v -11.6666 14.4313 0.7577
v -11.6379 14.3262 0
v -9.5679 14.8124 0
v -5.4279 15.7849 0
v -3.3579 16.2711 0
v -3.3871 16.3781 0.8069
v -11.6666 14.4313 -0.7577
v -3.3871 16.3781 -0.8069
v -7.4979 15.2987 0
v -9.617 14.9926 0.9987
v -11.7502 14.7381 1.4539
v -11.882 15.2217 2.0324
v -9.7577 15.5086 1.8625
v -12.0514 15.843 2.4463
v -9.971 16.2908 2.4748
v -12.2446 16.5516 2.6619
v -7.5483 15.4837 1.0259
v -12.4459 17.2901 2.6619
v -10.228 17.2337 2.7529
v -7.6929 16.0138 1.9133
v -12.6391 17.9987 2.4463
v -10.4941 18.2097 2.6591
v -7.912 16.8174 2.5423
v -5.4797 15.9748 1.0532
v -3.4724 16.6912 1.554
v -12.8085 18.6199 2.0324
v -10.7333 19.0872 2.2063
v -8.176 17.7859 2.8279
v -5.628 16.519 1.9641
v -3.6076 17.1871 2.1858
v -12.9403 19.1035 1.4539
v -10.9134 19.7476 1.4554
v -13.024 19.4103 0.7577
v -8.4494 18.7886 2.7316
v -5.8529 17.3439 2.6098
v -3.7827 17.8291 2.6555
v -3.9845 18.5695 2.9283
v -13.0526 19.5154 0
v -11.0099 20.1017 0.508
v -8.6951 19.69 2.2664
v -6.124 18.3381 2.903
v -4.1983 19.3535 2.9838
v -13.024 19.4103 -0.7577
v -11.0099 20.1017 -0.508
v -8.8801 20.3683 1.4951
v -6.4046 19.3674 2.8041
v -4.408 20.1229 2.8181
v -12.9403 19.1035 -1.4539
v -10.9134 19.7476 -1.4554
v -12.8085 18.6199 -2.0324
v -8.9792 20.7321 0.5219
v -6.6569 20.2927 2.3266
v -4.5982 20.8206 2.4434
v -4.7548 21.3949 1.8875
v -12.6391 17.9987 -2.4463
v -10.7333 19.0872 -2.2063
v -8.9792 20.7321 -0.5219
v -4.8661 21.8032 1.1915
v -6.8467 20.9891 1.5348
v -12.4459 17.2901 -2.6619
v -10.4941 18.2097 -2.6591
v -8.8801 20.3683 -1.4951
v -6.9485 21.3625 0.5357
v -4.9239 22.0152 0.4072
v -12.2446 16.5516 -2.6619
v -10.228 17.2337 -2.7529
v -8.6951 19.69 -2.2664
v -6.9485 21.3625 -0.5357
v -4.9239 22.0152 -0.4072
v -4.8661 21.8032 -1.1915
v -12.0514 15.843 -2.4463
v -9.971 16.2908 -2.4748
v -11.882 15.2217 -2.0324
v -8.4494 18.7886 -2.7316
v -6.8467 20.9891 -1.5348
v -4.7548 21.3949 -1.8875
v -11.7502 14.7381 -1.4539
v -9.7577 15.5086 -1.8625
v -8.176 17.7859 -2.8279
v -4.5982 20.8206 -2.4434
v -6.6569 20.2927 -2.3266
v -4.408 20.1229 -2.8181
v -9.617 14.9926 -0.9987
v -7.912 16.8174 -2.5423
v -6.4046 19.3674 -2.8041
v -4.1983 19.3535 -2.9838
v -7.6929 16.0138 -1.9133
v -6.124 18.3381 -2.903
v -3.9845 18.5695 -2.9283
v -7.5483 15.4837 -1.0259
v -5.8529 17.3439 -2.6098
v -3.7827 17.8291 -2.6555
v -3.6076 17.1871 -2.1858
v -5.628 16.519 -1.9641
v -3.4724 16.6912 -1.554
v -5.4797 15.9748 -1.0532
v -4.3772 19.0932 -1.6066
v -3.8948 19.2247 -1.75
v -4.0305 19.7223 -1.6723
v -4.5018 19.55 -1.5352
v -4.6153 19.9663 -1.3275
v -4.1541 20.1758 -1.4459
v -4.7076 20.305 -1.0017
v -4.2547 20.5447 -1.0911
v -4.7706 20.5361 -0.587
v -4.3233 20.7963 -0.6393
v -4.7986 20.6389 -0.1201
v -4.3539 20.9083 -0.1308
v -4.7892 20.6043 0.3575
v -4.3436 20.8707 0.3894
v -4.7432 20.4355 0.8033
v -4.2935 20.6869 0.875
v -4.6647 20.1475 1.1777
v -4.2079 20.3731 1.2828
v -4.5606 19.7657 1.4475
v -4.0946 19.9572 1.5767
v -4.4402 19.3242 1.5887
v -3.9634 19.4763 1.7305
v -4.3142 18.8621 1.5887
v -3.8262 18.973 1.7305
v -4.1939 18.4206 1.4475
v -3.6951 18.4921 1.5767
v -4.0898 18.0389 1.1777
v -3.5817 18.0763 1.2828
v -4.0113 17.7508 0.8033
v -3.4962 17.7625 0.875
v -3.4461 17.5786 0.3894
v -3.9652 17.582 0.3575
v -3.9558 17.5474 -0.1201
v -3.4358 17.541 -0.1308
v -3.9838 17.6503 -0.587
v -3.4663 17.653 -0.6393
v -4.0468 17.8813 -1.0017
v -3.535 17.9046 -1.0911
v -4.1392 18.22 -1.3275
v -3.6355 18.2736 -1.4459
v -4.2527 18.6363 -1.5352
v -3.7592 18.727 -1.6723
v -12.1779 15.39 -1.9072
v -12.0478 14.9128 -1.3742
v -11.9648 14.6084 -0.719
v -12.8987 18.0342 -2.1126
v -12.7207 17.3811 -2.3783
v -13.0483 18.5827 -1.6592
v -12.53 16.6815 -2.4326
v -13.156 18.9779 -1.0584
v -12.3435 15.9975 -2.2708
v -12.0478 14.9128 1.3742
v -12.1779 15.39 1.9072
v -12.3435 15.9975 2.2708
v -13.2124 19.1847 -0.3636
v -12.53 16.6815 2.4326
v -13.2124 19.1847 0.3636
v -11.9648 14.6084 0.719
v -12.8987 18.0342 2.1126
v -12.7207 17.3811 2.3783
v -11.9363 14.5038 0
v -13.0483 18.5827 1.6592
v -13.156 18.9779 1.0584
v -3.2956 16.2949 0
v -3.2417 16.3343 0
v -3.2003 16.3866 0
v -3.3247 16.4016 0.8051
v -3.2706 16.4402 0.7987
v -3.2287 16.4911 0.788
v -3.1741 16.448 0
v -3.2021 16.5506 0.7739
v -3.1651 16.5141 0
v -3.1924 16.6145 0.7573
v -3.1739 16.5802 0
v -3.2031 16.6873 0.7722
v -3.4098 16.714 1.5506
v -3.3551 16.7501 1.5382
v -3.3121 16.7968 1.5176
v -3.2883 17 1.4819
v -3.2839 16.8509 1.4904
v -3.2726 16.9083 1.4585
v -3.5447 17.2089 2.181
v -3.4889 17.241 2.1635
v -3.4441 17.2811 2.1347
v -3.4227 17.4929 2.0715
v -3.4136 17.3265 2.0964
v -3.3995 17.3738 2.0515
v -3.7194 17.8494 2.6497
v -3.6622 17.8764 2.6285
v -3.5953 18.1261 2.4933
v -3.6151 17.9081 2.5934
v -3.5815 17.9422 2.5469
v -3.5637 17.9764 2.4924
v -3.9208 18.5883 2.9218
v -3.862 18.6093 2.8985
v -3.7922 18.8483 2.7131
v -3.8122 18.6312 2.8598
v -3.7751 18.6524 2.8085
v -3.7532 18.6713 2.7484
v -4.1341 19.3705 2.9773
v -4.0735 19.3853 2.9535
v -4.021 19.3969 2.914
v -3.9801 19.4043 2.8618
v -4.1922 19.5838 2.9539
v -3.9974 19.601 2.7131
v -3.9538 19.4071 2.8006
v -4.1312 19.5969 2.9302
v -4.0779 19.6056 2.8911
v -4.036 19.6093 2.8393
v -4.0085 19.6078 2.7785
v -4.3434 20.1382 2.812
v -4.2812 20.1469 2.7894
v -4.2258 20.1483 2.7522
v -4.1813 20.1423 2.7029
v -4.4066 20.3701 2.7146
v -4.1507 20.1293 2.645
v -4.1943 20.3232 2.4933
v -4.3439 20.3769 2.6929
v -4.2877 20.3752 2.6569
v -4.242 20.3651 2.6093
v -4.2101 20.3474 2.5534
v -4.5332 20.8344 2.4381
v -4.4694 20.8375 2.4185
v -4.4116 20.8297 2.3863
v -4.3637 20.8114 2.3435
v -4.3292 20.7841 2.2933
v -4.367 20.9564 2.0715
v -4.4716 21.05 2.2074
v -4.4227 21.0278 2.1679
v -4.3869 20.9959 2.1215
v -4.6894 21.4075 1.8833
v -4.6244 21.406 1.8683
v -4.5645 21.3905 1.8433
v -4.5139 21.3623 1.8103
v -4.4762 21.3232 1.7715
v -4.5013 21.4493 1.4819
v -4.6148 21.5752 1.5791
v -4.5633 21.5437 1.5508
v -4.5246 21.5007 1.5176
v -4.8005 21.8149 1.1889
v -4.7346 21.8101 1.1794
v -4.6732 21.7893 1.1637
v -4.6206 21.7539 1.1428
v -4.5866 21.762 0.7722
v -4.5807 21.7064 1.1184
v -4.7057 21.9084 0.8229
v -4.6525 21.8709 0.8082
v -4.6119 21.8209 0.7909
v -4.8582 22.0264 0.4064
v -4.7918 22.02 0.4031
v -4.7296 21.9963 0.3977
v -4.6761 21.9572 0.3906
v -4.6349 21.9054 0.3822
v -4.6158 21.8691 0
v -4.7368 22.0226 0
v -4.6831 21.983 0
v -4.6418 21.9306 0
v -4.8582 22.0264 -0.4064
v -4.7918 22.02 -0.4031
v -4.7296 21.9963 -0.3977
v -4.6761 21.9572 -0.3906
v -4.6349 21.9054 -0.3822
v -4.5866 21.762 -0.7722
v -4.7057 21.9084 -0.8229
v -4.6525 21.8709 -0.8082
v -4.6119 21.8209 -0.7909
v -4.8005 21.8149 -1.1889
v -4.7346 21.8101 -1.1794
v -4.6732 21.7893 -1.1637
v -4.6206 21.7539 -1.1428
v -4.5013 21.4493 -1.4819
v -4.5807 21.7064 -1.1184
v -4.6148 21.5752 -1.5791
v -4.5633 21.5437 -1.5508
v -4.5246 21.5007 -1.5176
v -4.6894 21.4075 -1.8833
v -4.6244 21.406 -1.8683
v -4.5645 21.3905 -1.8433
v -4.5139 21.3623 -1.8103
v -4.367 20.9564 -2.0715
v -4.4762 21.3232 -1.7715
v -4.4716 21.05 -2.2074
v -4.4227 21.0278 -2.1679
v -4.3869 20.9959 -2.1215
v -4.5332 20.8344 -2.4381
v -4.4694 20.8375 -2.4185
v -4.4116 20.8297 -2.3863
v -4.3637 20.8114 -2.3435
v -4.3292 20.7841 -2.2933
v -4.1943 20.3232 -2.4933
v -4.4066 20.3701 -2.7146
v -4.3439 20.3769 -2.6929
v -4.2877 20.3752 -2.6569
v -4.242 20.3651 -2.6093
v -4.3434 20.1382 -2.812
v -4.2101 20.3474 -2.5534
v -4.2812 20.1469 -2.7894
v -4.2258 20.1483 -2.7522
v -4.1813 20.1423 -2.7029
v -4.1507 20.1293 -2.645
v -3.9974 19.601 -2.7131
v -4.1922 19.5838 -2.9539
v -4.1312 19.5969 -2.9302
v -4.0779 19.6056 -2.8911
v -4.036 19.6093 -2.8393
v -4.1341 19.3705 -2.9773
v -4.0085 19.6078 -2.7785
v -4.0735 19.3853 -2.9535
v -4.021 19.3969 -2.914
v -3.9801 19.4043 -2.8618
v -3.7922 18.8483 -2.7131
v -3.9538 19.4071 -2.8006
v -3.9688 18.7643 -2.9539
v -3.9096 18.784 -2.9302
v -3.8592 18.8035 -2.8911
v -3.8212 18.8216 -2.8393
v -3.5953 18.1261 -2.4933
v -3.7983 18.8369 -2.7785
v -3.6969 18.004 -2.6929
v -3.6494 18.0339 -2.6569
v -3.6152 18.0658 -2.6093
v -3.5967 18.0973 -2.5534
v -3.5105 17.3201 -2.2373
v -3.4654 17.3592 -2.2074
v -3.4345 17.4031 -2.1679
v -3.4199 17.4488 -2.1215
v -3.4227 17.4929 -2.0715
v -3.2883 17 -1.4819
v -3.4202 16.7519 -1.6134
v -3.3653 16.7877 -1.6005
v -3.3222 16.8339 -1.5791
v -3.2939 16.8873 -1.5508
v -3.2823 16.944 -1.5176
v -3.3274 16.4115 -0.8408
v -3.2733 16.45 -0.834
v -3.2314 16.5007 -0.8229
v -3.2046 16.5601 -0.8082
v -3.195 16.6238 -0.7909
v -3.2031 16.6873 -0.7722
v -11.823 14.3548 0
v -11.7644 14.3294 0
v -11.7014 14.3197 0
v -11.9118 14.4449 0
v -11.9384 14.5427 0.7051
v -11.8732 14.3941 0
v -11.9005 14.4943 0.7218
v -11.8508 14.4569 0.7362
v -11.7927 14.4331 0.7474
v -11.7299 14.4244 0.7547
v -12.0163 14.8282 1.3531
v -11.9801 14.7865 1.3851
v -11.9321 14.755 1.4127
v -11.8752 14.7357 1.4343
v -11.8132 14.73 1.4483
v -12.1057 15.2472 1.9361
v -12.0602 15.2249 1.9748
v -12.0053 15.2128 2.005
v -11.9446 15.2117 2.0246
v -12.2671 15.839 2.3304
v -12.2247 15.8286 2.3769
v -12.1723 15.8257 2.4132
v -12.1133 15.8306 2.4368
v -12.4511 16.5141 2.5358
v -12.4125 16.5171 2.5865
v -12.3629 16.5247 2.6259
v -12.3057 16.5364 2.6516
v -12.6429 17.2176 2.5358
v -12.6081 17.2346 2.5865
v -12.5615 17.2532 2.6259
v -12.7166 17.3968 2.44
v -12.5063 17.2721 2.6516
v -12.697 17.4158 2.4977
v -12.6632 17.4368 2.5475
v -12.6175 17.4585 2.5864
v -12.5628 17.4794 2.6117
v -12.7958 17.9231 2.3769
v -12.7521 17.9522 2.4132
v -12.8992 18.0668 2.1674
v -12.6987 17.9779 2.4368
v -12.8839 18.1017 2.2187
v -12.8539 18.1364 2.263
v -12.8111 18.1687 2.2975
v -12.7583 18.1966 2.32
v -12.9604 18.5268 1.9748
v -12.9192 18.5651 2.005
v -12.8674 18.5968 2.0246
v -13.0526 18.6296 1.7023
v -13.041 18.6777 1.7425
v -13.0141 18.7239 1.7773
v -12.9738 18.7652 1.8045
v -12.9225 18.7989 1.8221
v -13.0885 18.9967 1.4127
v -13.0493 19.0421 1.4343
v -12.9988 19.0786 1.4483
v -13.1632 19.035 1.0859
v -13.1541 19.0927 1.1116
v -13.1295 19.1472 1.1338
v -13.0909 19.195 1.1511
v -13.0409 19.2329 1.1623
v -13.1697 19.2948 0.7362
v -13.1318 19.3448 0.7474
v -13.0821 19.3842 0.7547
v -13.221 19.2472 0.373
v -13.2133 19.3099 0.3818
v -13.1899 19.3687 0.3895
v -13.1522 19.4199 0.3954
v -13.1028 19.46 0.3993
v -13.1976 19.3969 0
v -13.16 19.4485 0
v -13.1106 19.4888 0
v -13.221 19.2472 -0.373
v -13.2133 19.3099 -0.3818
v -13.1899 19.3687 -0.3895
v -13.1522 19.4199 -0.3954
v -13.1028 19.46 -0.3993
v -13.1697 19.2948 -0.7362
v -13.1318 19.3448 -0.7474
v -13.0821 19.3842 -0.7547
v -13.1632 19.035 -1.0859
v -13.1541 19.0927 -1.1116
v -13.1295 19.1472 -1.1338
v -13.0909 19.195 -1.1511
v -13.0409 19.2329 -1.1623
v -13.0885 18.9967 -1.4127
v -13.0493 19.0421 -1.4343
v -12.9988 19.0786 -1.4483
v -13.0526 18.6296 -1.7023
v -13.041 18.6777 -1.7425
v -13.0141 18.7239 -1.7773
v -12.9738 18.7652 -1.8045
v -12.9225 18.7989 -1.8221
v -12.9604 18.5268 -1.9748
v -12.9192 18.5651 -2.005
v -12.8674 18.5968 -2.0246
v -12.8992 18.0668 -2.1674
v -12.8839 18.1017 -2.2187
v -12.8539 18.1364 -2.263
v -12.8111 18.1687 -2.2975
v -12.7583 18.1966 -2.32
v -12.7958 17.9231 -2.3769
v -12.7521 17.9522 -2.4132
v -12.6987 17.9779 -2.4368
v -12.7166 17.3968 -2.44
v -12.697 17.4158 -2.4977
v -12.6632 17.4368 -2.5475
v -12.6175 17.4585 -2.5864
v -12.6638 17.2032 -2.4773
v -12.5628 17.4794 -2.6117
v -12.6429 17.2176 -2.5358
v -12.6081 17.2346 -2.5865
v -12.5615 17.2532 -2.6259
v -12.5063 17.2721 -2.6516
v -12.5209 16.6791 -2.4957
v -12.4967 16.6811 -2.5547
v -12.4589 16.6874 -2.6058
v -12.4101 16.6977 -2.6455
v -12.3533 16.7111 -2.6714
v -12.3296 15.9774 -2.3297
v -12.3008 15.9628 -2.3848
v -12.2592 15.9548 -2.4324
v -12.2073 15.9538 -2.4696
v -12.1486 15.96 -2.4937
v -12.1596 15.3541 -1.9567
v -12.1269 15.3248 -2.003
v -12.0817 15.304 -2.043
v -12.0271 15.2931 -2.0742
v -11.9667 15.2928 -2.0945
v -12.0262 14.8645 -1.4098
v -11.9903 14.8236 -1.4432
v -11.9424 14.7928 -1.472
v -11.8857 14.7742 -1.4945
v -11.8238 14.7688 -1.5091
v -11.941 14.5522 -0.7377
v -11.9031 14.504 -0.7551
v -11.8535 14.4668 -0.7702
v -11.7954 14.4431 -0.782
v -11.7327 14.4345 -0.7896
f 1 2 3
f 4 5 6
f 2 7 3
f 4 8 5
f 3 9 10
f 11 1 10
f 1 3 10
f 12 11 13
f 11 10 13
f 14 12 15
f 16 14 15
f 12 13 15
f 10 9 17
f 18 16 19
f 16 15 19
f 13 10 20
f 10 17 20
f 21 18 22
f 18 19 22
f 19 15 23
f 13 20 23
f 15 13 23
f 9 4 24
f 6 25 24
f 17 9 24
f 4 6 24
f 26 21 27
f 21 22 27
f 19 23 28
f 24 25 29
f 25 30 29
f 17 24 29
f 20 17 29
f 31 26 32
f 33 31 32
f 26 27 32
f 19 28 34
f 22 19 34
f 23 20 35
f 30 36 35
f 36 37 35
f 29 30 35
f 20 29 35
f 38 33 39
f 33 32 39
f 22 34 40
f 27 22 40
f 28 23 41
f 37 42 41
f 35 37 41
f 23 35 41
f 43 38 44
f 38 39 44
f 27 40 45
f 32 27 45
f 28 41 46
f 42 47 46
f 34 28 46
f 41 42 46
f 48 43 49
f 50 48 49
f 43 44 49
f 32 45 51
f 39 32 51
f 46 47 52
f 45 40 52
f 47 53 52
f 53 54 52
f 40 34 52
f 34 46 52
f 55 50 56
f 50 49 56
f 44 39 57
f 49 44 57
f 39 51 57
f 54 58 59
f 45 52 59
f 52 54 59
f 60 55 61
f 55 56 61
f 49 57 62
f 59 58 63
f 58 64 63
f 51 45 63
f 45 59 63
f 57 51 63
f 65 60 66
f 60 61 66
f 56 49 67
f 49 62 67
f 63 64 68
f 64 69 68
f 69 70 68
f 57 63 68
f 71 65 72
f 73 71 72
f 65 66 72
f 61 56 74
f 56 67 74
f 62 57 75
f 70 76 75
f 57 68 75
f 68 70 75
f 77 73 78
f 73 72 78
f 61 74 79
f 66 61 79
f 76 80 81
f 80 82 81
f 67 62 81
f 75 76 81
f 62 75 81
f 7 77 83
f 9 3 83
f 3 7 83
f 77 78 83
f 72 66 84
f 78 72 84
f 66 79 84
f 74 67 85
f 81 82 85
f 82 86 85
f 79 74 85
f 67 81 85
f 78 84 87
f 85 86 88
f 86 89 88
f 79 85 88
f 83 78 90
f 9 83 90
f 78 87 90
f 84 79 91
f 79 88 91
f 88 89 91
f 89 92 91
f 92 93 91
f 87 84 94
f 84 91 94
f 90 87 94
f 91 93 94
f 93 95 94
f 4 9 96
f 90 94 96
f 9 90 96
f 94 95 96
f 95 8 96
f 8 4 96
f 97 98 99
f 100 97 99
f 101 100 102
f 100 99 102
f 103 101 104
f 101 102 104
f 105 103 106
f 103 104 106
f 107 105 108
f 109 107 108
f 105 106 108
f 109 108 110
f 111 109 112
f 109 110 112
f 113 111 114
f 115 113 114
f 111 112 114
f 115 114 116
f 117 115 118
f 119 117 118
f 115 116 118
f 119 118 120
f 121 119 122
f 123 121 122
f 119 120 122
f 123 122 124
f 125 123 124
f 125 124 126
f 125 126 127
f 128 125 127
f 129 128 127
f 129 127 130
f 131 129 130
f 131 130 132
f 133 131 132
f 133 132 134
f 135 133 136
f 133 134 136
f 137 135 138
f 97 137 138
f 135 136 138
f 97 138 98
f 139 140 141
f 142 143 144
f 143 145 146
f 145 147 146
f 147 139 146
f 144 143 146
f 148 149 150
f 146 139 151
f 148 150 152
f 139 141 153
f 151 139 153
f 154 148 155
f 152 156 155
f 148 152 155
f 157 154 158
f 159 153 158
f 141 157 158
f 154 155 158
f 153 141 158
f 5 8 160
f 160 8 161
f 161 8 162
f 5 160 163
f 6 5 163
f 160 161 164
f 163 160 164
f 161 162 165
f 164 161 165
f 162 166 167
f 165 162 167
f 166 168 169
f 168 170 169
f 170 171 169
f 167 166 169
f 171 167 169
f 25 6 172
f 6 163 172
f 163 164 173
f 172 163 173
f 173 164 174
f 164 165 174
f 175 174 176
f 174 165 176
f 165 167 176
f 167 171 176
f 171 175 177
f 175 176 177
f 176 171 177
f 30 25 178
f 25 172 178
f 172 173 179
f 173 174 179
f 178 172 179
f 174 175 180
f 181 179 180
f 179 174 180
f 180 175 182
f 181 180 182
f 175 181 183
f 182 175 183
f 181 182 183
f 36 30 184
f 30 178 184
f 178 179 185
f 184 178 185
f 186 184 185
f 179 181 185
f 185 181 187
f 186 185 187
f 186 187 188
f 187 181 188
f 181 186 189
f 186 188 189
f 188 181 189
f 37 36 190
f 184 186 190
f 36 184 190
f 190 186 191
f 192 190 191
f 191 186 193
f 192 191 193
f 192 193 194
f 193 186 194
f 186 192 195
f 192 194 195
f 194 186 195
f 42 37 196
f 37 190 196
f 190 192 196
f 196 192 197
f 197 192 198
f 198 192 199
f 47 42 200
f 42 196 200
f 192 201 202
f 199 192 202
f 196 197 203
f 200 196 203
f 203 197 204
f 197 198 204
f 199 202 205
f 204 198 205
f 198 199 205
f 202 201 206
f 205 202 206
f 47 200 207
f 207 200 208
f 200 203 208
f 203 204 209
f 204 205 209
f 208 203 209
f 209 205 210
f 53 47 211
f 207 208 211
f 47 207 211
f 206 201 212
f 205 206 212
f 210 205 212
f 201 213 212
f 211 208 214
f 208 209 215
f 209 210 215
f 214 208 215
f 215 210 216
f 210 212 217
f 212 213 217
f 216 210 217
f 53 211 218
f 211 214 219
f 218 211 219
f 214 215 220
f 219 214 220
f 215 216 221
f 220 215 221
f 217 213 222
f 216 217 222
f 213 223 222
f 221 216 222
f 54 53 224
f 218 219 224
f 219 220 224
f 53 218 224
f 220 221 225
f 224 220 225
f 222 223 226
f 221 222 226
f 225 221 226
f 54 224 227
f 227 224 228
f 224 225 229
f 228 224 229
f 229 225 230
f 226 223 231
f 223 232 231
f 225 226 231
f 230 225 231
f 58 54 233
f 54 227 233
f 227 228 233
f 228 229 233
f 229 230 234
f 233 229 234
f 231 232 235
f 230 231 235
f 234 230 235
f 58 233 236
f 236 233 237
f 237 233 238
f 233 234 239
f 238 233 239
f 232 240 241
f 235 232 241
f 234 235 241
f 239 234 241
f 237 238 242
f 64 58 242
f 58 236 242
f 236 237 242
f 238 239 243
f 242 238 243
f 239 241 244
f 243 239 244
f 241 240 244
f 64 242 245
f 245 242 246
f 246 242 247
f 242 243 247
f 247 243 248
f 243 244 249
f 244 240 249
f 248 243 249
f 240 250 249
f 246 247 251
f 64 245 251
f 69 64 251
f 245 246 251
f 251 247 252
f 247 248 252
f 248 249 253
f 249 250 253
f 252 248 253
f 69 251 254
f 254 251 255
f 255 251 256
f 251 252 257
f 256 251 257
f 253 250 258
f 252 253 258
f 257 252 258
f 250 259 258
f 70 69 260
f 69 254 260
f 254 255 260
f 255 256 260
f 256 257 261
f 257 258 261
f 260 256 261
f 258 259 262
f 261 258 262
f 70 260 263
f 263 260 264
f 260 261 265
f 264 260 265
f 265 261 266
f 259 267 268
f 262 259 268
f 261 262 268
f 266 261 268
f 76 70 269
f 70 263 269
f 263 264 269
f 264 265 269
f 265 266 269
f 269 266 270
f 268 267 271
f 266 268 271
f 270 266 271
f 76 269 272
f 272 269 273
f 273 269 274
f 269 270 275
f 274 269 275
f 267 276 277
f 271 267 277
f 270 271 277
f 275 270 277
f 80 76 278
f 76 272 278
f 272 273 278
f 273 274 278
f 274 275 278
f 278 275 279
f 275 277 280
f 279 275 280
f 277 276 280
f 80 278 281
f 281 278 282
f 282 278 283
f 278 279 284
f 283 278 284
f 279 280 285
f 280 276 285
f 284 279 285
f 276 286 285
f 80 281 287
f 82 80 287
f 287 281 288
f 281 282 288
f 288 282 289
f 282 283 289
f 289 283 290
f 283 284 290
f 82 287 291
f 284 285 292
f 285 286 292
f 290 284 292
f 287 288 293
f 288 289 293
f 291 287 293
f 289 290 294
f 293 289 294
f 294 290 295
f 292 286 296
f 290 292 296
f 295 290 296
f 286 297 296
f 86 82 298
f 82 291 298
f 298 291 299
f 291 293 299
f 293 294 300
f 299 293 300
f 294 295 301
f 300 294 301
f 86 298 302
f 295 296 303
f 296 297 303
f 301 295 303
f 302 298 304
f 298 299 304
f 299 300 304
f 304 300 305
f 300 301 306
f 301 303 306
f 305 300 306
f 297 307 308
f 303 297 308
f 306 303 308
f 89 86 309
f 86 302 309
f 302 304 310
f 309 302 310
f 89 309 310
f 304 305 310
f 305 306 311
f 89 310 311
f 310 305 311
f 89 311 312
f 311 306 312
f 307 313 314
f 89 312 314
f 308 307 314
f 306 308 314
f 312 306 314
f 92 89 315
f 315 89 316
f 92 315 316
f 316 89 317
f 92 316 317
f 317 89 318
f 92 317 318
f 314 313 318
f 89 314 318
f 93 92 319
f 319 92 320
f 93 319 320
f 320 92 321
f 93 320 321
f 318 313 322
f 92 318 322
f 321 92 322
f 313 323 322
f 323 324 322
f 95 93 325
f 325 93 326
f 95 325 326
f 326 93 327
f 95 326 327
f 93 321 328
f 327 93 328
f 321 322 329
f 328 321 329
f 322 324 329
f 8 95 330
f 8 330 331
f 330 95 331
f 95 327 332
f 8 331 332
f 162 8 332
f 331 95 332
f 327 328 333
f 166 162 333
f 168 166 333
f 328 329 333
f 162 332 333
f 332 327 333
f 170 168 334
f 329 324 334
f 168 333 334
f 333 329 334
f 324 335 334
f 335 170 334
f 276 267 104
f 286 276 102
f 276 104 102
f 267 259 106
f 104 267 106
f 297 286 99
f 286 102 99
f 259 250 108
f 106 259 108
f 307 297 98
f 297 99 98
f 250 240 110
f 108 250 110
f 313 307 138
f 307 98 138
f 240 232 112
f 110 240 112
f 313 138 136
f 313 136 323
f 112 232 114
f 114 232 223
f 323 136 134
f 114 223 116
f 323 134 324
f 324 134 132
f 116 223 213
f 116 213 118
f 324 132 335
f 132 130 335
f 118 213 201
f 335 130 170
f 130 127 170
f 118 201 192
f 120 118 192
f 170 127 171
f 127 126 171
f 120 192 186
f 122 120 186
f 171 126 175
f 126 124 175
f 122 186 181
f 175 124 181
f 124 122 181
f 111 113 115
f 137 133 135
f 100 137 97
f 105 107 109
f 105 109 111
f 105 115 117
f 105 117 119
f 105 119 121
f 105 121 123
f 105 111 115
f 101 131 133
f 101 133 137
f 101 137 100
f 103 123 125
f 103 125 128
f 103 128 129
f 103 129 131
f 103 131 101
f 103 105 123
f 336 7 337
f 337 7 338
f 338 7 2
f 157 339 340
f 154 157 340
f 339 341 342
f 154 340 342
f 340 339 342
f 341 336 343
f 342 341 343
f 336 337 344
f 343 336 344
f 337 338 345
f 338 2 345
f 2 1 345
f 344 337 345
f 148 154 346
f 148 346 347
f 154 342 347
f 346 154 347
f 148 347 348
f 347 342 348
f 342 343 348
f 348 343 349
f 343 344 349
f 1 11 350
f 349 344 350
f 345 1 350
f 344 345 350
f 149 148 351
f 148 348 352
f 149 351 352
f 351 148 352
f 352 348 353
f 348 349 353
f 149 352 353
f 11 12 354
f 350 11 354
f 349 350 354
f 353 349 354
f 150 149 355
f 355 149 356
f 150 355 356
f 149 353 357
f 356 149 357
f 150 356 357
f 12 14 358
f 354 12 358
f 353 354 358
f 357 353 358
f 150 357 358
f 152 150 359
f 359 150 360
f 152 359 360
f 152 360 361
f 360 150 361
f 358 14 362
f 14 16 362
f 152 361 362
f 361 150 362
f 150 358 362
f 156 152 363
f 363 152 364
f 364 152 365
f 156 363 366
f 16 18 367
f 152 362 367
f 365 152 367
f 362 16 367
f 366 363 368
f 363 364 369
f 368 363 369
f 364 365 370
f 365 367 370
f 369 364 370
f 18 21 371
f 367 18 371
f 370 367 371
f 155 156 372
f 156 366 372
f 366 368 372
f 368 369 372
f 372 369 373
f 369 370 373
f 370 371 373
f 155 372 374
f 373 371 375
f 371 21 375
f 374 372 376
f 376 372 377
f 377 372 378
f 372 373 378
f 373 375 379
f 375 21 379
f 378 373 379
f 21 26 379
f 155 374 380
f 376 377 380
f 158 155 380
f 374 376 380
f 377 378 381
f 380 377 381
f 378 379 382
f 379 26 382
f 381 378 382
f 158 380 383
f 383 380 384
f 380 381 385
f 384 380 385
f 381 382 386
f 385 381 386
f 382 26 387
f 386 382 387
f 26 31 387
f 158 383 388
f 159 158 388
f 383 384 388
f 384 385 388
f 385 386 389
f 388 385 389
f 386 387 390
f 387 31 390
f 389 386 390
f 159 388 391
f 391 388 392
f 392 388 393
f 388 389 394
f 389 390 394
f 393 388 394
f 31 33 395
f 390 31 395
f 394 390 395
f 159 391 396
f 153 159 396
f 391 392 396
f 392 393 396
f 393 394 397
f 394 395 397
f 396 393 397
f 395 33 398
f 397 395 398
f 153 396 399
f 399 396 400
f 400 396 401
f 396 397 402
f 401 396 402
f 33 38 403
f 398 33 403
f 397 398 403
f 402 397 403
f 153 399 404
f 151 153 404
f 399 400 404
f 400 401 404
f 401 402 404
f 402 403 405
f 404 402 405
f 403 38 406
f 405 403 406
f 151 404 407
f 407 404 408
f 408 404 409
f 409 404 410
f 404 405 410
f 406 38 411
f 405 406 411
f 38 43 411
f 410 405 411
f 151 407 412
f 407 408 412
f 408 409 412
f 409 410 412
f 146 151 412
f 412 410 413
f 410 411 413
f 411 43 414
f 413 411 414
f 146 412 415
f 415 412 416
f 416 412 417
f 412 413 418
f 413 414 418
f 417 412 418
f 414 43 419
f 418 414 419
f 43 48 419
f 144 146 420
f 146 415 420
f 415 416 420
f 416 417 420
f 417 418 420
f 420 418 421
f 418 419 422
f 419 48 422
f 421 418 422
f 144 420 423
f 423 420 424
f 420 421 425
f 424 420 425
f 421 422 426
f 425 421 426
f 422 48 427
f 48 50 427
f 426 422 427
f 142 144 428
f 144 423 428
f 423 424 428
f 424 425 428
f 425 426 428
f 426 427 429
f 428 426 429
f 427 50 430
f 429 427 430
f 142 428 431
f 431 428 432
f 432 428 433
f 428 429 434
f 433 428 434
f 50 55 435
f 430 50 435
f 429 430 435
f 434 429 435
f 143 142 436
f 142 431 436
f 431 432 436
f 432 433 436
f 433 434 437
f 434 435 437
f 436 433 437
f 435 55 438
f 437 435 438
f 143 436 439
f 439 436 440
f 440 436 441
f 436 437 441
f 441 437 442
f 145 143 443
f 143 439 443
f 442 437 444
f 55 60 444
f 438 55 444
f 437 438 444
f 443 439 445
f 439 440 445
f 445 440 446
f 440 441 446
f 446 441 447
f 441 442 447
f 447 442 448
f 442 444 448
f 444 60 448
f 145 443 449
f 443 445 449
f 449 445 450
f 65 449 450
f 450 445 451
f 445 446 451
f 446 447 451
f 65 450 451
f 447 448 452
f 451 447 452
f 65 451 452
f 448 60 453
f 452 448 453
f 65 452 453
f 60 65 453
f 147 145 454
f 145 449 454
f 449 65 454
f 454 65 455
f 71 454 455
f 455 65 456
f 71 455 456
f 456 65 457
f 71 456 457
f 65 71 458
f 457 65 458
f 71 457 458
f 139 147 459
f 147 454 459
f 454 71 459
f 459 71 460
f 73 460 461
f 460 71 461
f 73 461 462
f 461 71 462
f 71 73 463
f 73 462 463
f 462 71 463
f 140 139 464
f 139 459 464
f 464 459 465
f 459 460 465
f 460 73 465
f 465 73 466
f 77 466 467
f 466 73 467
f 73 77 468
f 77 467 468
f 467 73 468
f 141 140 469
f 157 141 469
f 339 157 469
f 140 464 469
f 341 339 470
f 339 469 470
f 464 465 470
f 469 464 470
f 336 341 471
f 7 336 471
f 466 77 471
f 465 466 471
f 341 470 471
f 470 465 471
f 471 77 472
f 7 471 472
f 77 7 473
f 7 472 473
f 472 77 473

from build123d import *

# Parameters (mm, degrees)
ESQUISSE3_R             = 1.75
ENL_V_MAT_EXTRU_1_DEPTH = 0.5
ENL_V_MAT_EXTRU_1_DRAFT = -16
CONG_1_R                = 0.25


with BuildPart() as part:
    # Esquisse1 → Base-Révolution (revolve)
    with BuildSketch(Plane.XY, mode=Mode.PRIVATE) as base_r_volution_sk:
        Polygon((-3.894833669, 19.224673744), (-12.577919584, 16.857392814), (-13.2830375, 19.443735386), (-4.683927313, 22.119035716), align=None)
    revolve(base_r_volution_sk.sketch.rotate(Axis((3.55560583, 21.25589669, 0), (-0.9647873238288128, -0.2630312144579755, 0)), 180), axis=Axis((3.55560583, 21.25589669, 0), (-0.9647873238288128, -0.2630312144579755, 0)))


with BuildPart() as enl_v_mat_extru_1_tool:
    # Esquisse3 → Enlèv. mat.-Extru.1 (with draft: the straight prism first)
    with BuildSketch(Plane(origin=(1.253261753, 0.341678371, 0), x_dir=(0, 0, -1), z_dir=(0.9647873238288128, 0.26303121445797556, 0))):
        with Locations((0, 19.572184363)):
            Circle(ESQUISSE3_R)
    extrude(amount=-ENL_V_MAT_EXTRU_1_DEPTH)
    # Enlèv. mat.-Extru.1: the draft: its side faces are tilted about the plane it starts from
    enl_v_mat_extru_1_sides = [enl_v_mat_extru_1_tool.faces().sort_by_distance(p)[0] for p in [
        (-4.1360305, 19.158915941, 1.75),
    ]]
    draft(enl_v_mat_extru_1_sides, Plane(origin=(1.253261753, 0.341678371, 0), x_dir=(0, 0, -1), z_dir=(0.9647873238288128, 0.26303121445797556, 0)), ENL_V_MAT_EXTRU_1_DRAFT)


with BuildPart() as part_1:
    add(part.part)

    # Enlèv. mat.-Extru.1: cut by enl_v_mat_extru_1_tool
    add(enl_v_mat_extru_1_tool.part, mode=Mode.SUBTRACT)

    # Congé1
    cong_1_edges = [part_1.edges().sort_by_distance(p)[0] for p in [
        (-13.2830375, 19.443735386, 0),
        (-4.683927313, 22.119035716, 0),
    ]]
    fillet(cong_1_edges, radius=CONG_1_R)


solid = part_1.part
